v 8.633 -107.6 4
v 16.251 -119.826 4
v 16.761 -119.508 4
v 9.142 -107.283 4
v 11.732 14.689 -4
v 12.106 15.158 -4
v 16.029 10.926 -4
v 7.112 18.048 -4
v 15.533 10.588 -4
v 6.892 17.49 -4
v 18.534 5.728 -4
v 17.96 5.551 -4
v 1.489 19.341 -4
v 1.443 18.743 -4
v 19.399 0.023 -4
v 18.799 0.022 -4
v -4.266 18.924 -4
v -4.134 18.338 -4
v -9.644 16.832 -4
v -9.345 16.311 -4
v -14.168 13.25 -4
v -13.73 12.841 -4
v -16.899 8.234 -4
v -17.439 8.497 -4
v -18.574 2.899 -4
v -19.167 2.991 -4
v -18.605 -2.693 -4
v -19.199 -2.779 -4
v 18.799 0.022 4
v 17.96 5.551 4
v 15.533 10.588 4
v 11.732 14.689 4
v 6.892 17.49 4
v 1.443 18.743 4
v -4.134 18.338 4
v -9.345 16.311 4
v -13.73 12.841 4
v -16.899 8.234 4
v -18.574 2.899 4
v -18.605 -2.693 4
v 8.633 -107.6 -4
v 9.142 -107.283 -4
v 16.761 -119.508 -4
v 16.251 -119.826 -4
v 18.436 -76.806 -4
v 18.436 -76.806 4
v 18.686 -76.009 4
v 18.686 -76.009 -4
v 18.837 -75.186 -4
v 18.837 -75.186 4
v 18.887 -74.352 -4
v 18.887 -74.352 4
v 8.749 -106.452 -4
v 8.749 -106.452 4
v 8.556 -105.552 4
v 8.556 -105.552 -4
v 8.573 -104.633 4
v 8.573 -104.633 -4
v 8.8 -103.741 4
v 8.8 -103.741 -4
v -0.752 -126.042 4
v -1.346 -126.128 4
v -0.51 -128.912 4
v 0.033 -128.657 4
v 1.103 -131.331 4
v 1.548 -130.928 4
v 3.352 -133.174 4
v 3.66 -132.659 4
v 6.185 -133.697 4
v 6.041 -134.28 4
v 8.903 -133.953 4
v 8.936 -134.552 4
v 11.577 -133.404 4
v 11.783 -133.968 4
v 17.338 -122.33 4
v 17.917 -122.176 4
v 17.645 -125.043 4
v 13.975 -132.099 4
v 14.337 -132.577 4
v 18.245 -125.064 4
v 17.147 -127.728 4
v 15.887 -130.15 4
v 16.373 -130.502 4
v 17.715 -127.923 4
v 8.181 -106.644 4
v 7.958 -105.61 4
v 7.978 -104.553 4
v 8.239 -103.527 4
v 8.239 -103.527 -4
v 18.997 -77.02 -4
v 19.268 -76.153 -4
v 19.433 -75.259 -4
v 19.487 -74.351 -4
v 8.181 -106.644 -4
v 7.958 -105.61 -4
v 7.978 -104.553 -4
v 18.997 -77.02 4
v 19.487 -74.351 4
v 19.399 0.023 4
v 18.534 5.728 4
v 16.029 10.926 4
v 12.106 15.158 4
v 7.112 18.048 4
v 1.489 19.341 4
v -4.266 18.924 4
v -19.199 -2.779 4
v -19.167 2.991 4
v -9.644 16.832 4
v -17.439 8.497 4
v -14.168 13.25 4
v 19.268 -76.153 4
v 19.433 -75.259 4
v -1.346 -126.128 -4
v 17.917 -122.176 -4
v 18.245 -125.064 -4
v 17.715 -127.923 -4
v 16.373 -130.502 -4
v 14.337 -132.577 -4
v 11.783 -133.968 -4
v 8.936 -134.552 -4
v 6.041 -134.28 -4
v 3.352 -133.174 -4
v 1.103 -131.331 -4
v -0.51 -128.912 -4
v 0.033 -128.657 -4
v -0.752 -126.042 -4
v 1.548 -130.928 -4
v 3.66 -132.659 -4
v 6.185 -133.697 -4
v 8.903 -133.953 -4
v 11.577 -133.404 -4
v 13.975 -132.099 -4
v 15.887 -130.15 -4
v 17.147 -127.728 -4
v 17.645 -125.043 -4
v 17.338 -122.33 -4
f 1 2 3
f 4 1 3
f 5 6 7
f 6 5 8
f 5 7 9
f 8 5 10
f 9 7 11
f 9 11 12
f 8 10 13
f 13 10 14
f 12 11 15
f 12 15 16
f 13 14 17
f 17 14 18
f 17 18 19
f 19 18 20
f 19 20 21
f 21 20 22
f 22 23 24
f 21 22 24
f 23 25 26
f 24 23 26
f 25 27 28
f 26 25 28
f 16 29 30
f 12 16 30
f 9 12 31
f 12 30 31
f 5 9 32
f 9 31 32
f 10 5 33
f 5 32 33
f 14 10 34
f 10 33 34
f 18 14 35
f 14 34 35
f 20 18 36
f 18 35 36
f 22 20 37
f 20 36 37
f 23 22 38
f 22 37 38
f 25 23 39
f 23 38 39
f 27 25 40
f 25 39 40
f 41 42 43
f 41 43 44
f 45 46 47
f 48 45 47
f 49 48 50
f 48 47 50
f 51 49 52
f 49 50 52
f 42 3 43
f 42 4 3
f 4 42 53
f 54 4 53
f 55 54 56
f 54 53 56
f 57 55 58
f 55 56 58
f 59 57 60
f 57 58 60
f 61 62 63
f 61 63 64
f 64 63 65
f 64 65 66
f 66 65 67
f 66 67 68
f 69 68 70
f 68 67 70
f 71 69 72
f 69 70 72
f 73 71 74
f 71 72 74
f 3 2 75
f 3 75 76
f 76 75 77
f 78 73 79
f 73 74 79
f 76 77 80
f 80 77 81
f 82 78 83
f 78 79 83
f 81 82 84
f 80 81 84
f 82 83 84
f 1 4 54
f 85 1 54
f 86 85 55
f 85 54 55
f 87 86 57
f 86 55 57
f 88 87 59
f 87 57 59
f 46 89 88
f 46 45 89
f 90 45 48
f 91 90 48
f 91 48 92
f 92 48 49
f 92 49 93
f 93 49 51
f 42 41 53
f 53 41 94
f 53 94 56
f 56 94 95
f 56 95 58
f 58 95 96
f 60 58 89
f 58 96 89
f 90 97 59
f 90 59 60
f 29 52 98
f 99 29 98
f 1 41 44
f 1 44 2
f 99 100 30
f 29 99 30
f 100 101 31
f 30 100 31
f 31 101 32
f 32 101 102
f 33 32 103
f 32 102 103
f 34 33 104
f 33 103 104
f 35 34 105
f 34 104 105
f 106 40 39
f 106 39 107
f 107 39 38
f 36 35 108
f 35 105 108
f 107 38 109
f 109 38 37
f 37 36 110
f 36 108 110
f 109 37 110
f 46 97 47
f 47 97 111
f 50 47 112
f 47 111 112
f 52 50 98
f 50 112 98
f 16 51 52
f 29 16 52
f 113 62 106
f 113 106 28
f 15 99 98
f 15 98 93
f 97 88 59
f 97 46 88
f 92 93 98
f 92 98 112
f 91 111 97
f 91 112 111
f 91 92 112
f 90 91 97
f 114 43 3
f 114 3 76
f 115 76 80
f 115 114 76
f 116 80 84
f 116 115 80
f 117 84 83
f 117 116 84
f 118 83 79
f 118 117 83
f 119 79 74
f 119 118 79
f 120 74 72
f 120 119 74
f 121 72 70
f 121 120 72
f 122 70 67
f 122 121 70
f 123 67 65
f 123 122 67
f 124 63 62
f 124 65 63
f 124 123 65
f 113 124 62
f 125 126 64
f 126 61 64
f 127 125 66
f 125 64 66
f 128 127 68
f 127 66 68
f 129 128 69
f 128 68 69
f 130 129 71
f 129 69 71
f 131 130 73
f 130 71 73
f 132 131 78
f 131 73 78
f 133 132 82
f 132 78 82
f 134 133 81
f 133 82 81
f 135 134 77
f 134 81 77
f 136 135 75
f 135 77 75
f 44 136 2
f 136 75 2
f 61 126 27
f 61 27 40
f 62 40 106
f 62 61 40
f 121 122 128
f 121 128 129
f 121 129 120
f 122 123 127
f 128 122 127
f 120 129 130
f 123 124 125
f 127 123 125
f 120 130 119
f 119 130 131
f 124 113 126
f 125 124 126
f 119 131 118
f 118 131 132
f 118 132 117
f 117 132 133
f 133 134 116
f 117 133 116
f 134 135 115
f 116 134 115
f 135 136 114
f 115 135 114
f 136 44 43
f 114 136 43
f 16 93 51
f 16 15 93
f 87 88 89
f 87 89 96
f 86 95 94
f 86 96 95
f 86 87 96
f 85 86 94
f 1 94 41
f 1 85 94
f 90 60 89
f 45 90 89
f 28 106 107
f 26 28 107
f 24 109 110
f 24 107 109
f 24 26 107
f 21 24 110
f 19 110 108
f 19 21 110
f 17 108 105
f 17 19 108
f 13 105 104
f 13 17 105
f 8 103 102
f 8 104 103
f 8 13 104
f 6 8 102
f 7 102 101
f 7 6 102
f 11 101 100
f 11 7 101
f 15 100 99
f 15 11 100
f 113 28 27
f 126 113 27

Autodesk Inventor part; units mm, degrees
sketch "スケッチ パス" plane through (0, 0, 0) normal (0, 0, 1) x (1, 0, 0)
  arc A0 (19.09858, 0.022721) -> (-18.901655, -2.735635) centre (0, 0) ccw
  arc A1 (18.716428, -76.913324) -> (19.18706, -74.351396) centre (12.025093, -74.359916) ccw
  arc A2 (8.519671, -103.634445) -> (8.887698, -107.441661) centre (12.537104, -105.167493) ccw
  arc A3 (-1.049291, -126.085154) -> (16.506016, -119.666943) centre (8.401537, -124.717337) ccw
  line L0 (-1.049291, -126.085154) -> (-18.901655, -2.735635)
  line L1 (19.09858, 0.022721) -> (19.18706, -74.351396)
  line L2 (18.716428, -76.913324) -> (8.519671, -103.634445)
  line L3 (8.887698, -107.441661) -> (16.506016, -119.666943)
ref_plane "断面平面" through (-18.901655, -2.735635, 0) normal (0.1432375, -0.9896883, 0) x (0, 0, 1)
ref_plane "作業平面2" through (0, 0, 0) normal (-1, 0, 0) x (0, 0, 1)
ref_plane "作業平面3" through (8.401537, -124.717337, 0) normal (-0.4316004, 0.9020649, 0) x (0, 0, 1)
ref_plane "作業平面4" through (12.025093, -74.359916, 0) normal (0.0892463, 0.9960096, 0) x (0, 0, 1)
sketch "断面" plane through (-18.901655, -2.735635, 0) normal (0.1432375, -0.9896883, 0) x (0, 0, 1)
  line L0 (-4, 0.3) -> (4, 0.3)
  line L1 (4, 0.3) -> (4, -0.3)
  line L2 (4, -0.3) -> (-4, -0.3)
  line L3 (-4, -0.3) -> (-4, 0.3)
  line L4 (-4, 0) -> (4, 0) construction
  point P0 (0, 0)
  point P1 (0, 0)
  dimension "d0" = 8
  dimension "d4" = 0.3
  dimension "d5" = 0.3
sweep "ベルト" add profiles "断面" path "スケッチ パス"
equation "\"d4\" = da_a"
equation "\"d5\" = da_a2"
equation "\"da_B\" = 6"
equation "\"da_pb\" = 2.5"
equation "\"da_L\" = 345.26878"
equation "\"da_a\" = 0.3"
equation "\"da_S\" = 1.5"
equation "\"da_Beta\" = 20deg"
equation "\"da_Ht\" = 0.7"
equation "\"da_H\" = 1.3"
equation "\"da_a2\" = 0.3"
properties part number "歯付きベルト" material "Rubber"
